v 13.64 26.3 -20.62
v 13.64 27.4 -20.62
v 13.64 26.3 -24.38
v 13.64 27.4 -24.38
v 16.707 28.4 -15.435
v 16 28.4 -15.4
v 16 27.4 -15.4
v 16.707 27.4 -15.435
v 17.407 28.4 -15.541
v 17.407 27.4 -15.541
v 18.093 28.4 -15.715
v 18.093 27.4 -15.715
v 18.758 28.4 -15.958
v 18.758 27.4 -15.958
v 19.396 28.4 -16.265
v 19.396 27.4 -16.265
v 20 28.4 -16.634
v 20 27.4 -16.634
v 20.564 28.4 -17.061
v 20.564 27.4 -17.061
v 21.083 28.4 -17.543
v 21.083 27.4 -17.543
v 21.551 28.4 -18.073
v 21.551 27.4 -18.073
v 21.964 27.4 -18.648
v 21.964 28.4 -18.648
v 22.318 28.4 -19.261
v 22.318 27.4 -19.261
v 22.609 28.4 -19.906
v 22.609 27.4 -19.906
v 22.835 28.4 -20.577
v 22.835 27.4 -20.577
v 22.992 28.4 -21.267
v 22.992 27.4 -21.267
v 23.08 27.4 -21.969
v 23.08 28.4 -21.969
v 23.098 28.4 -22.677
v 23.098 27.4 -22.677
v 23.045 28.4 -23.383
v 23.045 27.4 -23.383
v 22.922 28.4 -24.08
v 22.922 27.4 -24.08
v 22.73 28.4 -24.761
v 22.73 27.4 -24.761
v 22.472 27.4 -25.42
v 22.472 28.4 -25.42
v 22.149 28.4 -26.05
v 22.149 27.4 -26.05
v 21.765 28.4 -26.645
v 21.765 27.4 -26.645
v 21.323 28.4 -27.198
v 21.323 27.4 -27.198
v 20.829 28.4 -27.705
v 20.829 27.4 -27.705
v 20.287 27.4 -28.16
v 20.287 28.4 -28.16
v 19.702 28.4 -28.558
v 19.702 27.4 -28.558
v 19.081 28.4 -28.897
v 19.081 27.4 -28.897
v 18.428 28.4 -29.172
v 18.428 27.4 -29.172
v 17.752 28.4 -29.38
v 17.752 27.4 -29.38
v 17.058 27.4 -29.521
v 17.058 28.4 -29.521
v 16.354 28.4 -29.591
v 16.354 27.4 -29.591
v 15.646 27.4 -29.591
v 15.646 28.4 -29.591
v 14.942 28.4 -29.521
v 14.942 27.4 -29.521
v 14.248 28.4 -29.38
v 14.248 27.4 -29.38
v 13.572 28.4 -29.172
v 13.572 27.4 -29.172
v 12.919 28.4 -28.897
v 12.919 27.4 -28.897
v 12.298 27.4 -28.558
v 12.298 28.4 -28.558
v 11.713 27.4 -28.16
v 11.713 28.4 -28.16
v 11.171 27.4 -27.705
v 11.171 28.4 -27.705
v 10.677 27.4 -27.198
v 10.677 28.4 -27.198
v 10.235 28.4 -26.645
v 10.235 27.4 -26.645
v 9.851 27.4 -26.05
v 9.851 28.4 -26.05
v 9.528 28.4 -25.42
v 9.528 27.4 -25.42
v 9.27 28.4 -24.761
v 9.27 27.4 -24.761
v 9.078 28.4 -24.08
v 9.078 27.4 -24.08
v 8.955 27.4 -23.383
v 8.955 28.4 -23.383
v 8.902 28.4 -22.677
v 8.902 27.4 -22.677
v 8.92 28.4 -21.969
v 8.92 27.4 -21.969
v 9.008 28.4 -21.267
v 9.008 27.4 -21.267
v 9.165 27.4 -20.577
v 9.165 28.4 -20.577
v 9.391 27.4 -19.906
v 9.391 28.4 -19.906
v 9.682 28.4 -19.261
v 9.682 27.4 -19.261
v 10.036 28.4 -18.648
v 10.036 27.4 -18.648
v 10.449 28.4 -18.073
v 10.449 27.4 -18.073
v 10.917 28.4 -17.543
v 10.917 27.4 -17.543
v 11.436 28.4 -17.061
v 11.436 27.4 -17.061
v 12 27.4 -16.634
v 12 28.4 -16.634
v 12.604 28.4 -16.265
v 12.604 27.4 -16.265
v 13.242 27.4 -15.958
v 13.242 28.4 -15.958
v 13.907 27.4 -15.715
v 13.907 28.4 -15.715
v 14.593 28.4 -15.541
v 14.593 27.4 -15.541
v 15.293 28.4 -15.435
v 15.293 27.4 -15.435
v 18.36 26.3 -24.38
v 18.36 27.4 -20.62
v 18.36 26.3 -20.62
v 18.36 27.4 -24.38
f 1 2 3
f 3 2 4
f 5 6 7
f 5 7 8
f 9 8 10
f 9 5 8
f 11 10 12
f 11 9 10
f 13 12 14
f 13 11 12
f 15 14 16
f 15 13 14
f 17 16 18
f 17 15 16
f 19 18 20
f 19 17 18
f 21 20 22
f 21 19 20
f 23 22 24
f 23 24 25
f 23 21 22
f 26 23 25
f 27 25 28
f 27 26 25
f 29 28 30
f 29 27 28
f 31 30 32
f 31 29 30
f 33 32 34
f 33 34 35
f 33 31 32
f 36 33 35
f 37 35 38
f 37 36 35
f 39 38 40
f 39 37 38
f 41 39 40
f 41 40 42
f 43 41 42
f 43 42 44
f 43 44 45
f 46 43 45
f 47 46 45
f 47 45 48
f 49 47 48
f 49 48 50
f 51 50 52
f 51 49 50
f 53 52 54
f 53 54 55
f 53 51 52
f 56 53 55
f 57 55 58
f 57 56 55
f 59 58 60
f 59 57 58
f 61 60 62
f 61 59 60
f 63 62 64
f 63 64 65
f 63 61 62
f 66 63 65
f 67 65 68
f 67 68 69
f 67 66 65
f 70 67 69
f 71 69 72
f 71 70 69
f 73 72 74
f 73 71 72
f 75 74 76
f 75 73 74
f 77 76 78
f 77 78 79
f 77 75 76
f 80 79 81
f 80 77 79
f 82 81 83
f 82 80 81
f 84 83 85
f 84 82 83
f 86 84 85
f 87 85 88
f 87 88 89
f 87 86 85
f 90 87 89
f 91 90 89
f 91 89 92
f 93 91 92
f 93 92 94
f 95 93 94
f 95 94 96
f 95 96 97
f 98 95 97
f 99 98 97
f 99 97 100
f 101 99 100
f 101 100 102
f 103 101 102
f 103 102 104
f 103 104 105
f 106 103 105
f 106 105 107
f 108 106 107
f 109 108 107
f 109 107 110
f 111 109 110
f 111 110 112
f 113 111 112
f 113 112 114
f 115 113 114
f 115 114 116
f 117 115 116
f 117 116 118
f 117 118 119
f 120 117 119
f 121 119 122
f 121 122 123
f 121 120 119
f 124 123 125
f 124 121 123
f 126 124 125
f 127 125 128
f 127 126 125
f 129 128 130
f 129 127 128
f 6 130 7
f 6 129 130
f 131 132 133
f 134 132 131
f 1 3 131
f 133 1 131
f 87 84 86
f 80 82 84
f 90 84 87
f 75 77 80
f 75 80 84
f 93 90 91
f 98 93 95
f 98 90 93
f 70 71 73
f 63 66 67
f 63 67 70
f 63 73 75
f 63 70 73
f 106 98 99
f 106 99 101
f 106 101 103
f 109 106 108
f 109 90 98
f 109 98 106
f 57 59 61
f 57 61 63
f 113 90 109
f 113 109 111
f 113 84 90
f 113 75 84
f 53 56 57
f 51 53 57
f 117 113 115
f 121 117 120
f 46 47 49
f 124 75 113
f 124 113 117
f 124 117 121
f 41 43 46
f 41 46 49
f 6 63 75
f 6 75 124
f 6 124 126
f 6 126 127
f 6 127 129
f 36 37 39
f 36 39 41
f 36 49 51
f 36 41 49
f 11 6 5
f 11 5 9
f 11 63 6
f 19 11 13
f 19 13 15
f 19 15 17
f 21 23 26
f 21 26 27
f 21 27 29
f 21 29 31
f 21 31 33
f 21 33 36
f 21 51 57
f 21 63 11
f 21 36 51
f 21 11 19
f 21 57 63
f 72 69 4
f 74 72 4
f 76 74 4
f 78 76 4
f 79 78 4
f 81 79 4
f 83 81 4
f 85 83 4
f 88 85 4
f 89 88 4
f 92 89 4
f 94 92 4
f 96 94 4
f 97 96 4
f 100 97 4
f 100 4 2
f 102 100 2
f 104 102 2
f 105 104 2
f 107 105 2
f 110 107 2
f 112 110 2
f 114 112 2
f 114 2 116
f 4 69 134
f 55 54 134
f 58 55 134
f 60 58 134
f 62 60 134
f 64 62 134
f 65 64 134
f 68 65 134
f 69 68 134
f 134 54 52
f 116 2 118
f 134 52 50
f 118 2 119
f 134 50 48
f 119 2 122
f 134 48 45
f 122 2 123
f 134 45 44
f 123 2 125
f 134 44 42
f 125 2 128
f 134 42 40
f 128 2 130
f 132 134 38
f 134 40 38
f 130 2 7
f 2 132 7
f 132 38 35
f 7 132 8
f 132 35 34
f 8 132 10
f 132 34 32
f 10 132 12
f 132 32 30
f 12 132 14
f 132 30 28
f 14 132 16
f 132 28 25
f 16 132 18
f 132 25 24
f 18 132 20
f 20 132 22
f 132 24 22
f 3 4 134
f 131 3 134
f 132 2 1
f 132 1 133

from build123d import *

# Parameters (mm, degrees)
PCB_SK1_R = 7.1
PCB_DEPTH = 1
MIC_SK2_W = 4.72
MIC_SK2_H = 3.76
MIC_DEPTH = 1.1


with BuildPart() as part:
    # PCB_Sk1 → PCB (new body)
    with BuildSketch(Plane(origin=(0, 28.4, 0), x_dir=(1, 0, 0), z_dir=(0, 1, 0))):
        with Locations(Location((16, 22.5, 0), (0, 0, 270))):
            Circle(PCB_SK1_R)
    extrude(amount=-PCB_DEPTH)

    # Mic_Sk2 → Mic (add)
    with BuildSketch(Plane(origin=(0, 27.4, 0), x_dir=(1, 0, 0), z_dir=(0, 1, 0))):
        with Locations((16, 22.5)):
            Rectangle(MIC_SK2_W, MIC_SK2_H)
    extrude(amount=-MIC_DEPTH)


solid = part.part
